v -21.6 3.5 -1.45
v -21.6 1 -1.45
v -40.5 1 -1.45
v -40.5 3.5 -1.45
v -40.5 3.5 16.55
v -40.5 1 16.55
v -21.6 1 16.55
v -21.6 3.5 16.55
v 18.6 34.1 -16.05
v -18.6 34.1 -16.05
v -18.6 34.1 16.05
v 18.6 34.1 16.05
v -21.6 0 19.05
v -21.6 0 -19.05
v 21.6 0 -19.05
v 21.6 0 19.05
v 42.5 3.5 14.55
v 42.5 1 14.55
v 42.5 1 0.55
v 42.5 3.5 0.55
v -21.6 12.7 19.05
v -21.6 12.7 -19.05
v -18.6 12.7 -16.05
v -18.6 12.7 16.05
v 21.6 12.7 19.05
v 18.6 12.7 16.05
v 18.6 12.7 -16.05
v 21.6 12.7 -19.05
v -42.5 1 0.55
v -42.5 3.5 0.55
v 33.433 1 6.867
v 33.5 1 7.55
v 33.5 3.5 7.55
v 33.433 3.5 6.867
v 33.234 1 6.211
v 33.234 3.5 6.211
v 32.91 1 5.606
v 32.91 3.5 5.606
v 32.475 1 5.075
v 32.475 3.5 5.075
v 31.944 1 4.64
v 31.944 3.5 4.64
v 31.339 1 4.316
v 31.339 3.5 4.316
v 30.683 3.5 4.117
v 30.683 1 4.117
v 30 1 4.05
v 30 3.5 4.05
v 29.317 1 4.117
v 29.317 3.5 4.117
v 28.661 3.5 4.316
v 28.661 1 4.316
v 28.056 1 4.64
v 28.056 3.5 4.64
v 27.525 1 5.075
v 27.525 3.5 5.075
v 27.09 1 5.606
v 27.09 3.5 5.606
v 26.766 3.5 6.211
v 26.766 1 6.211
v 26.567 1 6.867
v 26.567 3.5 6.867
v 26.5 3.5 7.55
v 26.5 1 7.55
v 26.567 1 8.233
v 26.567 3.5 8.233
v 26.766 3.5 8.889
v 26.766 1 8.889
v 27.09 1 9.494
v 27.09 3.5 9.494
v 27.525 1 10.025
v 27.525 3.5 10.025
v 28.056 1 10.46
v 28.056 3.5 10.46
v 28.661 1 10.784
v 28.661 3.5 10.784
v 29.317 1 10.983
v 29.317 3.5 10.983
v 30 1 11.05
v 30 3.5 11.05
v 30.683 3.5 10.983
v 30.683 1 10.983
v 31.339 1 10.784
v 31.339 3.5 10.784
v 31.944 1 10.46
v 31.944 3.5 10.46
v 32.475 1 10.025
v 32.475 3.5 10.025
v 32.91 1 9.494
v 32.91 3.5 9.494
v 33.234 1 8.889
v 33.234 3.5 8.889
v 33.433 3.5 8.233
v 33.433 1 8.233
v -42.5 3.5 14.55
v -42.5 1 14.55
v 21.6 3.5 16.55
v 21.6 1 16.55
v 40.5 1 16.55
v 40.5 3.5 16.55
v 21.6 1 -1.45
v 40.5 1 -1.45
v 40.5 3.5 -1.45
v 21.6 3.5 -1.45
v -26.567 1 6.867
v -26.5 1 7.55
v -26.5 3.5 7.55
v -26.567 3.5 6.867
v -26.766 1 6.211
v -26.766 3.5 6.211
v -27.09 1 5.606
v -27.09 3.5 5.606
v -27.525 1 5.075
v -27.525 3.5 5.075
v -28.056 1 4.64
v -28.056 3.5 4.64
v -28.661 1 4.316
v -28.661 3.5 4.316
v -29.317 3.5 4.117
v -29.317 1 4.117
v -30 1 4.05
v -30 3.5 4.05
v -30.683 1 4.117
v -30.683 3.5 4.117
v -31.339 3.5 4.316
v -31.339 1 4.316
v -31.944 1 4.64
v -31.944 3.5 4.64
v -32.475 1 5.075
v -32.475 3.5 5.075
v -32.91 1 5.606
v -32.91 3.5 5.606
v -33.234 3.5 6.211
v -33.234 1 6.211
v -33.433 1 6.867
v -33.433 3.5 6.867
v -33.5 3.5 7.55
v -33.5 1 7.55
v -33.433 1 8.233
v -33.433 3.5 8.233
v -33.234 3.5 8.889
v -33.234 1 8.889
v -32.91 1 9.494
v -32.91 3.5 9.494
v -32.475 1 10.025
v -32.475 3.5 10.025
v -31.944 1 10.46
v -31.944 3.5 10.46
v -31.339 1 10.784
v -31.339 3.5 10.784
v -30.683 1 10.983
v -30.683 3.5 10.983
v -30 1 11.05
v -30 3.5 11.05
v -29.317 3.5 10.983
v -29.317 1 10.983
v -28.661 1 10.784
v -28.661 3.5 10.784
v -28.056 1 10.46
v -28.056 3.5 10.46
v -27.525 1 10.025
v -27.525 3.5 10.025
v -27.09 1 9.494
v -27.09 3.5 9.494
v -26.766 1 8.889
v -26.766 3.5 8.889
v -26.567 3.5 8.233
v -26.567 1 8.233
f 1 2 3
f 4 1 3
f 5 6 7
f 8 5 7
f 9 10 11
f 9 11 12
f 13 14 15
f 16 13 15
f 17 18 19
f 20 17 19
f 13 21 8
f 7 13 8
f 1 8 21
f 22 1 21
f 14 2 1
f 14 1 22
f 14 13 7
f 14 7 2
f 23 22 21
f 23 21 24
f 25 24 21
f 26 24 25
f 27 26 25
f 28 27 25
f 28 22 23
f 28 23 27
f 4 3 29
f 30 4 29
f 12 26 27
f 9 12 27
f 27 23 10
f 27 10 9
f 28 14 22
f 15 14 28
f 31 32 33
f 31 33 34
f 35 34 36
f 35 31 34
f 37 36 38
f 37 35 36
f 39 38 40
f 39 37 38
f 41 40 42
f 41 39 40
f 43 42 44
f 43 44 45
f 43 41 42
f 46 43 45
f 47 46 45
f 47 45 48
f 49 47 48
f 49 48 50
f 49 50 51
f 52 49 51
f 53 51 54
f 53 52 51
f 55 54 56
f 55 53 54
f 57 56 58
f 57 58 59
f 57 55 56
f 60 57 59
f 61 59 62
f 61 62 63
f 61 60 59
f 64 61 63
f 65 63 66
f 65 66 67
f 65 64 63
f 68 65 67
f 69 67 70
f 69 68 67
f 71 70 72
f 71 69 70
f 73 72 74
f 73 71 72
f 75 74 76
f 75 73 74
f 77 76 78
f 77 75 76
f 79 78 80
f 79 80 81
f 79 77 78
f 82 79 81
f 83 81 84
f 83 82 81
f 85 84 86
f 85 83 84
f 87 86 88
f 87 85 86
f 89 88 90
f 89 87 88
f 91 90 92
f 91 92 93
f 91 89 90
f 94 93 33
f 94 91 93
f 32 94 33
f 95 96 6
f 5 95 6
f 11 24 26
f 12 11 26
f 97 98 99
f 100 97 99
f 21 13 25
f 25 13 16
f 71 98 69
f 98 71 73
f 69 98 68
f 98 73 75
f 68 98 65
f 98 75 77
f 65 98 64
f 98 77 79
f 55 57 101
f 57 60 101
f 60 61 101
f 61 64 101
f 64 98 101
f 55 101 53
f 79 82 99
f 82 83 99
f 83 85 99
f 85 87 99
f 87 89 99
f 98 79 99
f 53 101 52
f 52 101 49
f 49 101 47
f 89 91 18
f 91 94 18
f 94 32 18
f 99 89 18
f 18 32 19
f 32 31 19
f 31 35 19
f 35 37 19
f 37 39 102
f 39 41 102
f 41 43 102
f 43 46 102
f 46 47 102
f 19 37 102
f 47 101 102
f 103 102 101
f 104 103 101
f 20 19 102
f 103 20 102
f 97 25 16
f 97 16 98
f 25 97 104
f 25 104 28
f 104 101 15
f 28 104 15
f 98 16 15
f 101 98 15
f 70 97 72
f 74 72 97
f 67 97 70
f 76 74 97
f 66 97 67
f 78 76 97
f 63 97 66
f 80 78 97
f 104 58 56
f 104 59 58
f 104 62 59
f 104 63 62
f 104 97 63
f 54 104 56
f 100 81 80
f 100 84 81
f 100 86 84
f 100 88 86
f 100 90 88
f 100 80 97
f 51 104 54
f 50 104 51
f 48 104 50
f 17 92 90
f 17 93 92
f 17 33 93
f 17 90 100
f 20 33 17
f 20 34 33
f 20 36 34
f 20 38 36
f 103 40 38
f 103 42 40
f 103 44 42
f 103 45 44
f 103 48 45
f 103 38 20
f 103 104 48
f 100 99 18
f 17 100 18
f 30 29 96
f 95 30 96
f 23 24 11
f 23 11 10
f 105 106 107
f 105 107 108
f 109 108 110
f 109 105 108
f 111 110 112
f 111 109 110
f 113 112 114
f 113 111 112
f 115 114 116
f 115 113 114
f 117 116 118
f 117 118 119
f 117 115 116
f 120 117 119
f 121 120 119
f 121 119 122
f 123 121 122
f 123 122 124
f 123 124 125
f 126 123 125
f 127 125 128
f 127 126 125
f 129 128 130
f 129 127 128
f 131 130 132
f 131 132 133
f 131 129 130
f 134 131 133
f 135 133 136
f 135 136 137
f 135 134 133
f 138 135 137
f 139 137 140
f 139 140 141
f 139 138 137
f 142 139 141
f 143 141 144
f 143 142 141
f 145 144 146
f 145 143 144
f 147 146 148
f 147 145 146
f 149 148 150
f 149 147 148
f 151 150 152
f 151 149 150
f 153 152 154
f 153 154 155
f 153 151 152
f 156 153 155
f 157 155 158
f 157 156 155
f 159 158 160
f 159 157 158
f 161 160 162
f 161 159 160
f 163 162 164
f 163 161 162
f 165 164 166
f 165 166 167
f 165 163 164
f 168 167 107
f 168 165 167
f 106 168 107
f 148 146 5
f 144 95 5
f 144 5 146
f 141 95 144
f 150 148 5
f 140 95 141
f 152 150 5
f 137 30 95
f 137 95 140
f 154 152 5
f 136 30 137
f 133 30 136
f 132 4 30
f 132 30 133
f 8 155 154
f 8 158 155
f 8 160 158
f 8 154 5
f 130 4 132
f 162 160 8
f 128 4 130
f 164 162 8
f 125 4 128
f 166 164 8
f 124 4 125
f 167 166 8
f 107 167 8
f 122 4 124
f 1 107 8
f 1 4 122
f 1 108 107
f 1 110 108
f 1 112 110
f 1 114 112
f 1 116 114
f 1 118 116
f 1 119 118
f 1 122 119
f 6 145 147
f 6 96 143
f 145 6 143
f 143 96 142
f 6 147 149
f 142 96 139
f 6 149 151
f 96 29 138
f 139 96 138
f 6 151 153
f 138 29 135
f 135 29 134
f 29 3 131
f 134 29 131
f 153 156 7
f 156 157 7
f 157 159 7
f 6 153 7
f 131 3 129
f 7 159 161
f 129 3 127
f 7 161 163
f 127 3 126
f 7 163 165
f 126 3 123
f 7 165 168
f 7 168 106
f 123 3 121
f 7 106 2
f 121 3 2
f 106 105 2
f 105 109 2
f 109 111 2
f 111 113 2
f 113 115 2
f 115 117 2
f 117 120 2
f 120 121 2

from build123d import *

# Parameters (mm, degrees)
SKETCH1_W           = 37.2
SKETCH1_H           = 32.1
BOSS_EXTRUDE1_DEPTH = 34.1
SKETCH1_4_W         = 43.2
SKETCH1_4_H         = 38.1
SKETCH1_4_W_2       = 37.2
SKETCH1_4_H_2       = 32.1
BOSS_EXTRUDE2_DEPTH = 12.7
BOSS_EXTRUDE3_START = 1
SKETCH2_R           = 3.5
BOSS_EXTRUDE3_DEPTH = 2.5


with BuildPart() as part:
    # Sketch1 → Boss-Extrude1 (new body)
    with BuildSketch(Plane(origin=(0, 0, 0), x_dir=(1, 0, 0), z_dir=(0, 1, 0))):
        Rectangle(SKETCH1_W, SKETCH1_H)
    extrude(amount=BOSS_EXTRUDE1_DEPTH)

    # Sketch1<4> → Boss-Extrude2 (add)
    with BuildSketch(Plane(origin=(0, 0, 0), x_dir=(1, 0, 0), z_dir=(0, 1, 0))):
        Rectangle(SKETCH1_4_W, SKETCH1_4_H)
        Rectangle(SKETCH1_4_W_2, SKETCH1_4_H_2, mode=Mode.SUBTRACT)
    extrude(amount=BOSS_EXTRUDE2_DEPTH)

    # Sketch2 → Boss-Extrude3 (add)
    # profile 1 of 2: a face of its own
    with BuildSketch(Plane(origin=(0, 0, 0), x_dir=(1, 0, 0), z_dir=(0, 1, 0)).offset(BOSS_EXTRUDE3_START)):
        Polygon((-21.6, 1.45), (-40.5, 1.45), (-42.5, -0.55), (-42.5, -14.55), (-40.5, -16.55), (-21.6, -16.55), align=None)
        with Locations((-30, -7.55)):
            Circle(SKETCH2_R, mode=Mode.SUBTRACT)
    # profile 2 of 2: a face of its own
    with BuildSketch(Plane(origin=(0, 0, 0), x_dir=(1, 0, 0), z_dir=(0, 1, 0)).offset(BOSS_EXTRUDE3_START)):
        Polygon((21.6, -16.55), (40.5, -16.55), (42.5, -14.55), (42.5, -0.55), (40.5, 1.45), (21.6, 1.45), align=None)
        with Locations((30, -7.55)):
            Circle(SKETCH2_R, mode=Mode.SUBTRACT)
    extrude(amount=BOSS_EXTRUDE3_DEPTH)


solid = part.part
